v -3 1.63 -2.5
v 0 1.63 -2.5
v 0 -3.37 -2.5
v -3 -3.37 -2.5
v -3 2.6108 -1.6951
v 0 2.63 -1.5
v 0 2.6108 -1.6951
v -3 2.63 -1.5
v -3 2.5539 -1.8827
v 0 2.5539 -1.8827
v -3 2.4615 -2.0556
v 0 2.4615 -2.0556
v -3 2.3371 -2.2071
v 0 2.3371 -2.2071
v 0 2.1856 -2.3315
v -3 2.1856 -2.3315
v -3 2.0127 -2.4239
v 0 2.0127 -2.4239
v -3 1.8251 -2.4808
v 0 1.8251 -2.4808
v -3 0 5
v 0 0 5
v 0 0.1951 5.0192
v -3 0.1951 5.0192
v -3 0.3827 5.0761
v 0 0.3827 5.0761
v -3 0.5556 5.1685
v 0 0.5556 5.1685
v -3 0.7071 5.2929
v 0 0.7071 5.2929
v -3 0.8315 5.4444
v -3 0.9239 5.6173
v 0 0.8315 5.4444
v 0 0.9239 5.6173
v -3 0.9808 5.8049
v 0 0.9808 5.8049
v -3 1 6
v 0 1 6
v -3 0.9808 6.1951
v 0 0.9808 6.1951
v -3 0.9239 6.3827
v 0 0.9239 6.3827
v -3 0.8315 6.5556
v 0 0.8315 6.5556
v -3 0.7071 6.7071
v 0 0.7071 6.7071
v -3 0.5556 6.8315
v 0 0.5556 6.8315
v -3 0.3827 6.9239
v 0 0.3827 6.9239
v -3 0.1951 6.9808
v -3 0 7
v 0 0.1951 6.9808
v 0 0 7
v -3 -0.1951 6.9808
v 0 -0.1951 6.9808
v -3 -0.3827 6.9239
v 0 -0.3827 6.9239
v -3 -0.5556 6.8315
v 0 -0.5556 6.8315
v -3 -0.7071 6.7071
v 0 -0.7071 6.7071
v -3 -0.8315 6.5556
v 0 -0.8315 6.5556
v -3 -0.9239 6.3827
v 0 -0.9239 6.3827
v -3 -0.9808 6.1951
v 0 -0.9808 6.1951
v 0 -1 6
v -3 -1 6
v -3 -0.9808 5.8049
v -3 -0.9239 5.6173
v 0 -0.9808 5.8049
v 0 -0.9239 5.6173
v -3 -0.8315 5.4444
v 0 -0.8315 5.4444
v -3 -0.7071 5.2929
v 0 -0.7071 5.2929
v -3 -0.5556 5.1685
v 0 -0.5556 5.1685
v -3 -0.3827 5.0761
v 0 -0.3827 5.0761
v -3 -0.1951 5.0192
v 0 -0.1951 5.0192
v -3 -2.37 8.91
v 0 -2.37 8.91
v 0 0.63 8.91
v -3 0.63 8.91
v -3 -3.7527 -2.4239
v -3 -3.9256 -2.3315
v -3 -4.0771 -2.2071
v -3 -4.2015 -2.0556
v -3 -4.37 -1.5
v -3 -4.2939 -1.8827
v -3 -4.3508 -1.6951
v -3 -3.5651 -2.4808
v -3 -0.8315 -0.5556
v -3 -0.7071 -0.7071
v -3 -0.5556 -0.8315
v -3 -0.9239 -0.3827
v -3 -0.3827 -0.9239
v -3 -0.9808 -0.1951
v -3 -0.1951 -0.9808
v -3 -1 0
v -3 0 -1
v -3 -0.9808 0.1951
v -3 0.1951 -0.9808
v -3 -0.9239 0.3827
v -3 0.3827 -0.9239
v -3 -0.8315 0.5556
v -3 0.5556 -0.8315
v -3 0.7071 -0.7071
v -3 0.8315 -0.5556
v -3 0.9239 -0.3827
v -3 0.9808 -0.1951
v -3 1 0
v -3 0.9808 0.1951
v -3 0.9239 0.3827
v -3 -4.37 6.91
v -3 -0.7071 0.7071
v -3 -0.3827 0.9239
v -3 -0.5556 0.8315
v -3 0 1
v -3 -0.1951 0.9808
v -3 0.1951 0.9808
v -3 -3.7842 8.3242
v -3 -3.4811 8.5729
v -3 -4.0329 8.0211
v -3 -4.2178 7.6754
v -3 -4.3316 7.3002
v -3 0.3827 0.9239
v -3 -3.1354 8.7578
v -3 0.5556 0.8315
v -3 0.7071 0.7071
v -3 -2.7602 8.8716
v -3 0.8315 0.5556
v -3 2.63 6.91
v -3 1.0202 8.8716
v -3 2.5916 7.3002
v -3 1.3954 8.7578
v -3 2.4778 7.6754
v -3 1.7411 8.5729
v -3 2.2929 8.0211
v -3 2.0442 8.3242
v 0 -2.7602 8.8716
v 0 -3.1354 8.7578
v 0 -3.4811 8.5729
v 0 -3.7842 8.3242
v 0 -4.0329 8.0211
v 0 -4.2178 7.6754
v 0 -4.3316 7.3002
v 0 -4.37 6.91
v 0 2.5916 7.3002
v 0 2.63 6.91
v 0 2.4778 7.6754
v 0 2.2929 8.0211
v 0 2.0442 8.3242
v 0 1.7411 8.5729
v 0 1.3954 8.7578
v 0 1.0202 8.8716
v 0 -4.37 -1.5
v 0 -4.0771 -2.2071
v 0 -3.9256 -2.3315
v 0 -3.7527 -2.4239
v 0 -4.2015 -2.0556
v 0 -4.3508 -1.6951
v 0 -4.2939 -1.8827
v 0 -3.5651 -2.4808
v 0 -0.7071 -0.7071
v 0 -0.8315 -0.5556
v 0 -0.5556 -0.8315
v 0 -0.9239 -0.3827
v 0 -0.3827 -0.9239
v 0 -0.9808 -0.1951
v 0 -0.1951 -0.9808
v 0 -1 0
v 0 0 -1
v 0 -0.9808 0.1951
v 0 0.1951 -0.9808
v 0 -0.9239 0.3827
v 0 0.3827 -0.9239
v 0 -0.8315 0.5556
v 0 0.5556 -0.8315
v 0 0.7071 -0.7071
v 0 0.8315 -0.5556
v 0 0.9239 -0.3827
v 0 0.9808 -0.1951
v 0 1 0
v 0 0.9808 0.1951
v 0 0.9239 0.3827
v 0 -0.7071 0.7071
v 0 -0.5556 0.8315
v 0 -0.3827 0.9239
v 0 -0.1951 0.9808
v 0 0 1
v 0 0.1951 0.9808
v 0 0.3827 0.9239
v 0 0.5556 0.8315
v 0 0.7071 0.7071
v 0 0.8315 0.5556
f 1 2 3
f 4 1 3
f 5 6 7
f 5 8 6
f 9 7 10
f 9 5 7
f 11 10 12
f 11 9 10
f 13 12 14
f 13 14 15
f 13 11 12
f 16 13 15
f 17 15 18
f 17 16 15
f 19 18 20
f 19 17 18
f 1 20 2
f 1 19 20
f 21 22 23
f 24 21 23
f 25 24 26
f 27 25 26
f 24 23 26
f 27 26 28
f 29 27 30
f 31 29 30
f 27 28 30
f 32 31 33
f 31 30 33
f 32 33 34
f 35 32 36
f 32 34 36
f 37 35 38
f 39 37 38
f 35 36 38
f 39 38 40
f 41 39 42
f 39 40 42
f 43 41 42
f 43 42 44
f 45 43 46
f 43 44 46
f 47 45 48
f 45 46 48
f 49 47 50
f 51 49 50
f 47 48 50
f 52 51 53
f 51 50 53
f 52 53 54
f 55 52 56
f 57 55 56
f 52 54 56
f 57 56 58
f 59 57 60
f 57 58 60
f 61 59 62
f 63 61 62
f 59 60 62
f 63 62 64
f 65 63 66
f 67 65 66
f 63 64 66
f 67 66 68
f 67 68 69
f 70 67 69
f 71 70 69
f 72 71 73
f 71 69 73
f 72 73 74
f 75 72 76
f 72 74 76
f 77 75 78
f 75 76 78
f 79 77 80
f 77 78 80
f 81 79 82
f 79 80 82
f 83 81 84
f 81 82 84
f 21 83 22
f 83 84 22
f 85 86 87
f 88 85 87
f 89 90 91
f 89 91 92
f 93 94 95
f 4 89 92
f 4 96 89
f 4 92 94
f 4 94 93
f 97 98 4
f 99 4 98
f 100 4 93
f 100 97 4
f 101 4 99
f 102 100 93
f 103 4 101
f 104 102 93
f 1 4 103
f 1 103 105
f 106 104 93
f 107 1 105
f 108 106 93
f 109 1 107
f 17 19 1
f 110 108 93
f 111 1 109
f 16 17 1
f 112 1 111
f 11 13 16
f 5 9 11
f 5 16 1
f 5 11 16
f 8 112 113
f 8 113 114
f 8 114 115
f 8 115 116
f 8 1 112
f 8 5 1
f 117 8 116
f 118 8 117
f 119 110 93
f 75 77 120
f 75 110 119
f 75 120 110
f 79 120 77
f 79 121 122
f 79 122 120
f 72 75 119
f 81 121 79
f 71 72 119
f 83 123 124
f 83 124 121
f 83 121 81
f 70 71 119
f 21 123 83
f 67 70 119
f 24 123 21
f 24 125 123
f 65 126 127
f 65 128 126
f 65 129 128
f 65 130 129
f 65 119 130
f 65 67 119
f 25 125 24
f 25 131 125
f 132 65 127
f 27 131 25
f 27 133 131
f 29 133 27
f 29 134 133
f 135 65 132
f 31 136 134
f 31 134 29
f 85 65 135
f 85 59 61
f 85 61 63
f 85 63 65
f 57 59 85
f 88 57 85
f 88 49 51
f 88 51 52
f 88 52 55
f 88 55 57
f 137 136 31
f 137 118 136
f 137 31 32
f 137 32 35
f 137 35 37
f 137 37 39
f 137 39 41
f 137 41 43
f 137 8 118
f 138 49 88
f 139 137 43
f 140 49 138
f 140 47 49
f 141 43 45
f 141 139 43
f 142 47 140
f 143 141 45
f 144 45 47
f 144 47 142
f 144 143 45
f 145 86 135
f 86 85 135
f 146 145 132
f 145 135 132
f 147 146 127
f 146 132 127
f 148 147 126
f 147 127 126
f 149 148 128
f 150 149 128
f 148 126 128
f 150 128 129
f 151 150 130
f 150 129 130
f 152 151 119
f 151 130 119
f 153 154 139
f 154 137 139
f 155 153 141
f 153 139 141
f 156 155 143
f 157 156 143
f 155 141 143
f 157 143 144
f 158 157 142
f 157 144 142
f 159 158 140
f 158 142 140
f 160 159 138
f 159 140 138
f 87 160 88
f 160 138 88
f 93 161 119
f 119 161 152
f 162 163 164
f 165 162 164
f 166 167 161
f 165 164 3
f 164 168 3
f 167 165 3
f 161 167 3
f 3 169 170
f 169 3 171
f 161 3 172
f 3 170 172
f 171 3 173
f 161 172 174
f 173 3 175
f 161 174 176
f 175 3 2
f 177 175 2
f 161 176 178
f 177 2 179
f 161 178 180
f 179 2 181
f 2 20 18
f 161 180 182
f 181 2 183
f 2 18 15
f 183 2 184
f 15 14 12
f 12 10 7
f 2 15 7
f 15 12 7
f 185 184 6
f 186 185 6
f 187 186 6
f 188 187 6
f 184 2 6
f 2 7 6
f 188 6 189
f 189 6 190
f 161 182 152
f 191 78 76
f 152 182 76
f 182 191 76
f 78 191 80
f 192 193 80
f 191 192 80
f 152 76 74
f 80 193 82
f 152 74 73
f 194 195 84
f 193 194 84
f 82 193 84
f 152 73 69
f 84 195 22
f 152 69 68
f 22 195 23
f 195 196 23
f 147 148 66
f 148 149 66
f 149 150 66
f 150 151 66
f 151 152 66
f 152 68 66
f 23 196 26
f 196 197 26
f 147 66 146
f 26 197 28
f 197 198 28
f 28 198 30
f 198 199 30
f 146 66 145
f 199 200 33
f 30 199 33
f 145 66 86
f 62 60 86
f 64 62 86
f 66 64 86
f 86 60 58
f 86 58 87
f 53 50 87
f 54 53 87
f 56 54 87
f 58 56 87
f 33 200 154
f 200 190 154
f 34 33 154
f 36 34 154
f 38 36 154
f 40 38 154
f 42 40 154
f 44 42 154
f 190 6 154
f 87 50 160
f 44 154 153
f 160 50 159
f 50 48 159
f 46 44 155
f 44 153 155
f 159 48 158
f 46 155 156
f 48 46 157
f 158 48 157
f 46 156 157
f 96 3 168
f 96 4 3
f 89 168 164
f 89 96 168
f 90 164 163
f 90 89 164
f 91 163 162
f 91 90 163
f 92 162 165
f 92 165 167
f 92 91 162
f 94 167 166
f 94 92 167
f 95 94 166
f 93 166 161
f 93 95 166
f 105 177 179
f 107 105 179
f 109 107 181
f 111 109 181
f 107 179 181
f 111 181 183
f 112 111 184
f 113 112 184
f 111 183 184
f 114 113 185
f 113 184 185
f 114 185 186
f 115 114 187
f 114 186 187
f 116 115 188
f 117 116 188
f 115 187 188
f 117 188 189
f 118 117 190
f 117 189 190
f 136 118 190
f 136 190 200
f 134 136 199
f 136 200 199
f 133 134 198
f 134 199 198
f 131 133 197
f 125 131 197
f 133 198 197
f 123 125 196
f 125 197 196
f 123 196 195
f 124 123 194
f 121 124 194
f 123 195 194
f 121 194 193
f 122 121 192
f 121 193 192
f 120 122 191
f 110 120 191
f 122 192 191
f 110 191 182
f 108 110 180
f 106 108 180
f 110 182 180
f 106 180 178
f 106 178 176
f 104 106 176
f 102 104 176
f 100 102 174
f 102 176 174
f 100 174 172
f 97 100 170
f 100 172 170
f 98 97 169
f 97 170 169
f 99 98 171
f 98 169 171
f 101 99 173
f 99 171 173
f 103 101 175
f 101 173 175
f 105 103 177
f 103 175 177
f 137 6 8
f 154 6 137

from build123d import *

# Parameters (mm, degrees)
SKETCH1_R           = 1
BOSS_EXTRUDE1_DEPTH = 3
FILLET1_R           = 2
FILLET2_R           = 1


with BuildPart() as part:
    # Sketch1 → Boss-Extrude1 (new body)
    with BuildSketch(Plane(origin=(0, 0, 0), x_dir=(0, 0, -1), z_dir=(1, 0, 0))):
        Polygon((-1.868695944, 2.63), (2.5, 2.63), (2.5, -4.37), (-8.91, -4.37), (-8.91, 2.63), align=None)
        Circle(SKETCH1_R, mode=Mode.SUBTRACT)
        with Locations((-6, 0)):
            Circle(SKETCH1_R, mode=Mode.SUBTRACT)
    extrude(amount=-BOSS_EXTRUDE1_DEPTH)

    # Fillet1
    fillet1_edges = [part.edges().sort_by_distance(p)[0] for p in [
        (-1.5, -4.37, 8.91),
        (-1.5, 2.63, 8.91),
    ]]
    fillet(fillet1_edges, radius=FILLET1_R)

    # Fillet2
    fillet2_edges = [part.edges().sort_by_distance(p)[0] for p in [
        (-1.5, 2.63, -2.5),
        (-1.5, -4.37, -2.5),
    ]]
    fillet(fillet2_edges, radius=FILLET2_R)


solid = part.part
